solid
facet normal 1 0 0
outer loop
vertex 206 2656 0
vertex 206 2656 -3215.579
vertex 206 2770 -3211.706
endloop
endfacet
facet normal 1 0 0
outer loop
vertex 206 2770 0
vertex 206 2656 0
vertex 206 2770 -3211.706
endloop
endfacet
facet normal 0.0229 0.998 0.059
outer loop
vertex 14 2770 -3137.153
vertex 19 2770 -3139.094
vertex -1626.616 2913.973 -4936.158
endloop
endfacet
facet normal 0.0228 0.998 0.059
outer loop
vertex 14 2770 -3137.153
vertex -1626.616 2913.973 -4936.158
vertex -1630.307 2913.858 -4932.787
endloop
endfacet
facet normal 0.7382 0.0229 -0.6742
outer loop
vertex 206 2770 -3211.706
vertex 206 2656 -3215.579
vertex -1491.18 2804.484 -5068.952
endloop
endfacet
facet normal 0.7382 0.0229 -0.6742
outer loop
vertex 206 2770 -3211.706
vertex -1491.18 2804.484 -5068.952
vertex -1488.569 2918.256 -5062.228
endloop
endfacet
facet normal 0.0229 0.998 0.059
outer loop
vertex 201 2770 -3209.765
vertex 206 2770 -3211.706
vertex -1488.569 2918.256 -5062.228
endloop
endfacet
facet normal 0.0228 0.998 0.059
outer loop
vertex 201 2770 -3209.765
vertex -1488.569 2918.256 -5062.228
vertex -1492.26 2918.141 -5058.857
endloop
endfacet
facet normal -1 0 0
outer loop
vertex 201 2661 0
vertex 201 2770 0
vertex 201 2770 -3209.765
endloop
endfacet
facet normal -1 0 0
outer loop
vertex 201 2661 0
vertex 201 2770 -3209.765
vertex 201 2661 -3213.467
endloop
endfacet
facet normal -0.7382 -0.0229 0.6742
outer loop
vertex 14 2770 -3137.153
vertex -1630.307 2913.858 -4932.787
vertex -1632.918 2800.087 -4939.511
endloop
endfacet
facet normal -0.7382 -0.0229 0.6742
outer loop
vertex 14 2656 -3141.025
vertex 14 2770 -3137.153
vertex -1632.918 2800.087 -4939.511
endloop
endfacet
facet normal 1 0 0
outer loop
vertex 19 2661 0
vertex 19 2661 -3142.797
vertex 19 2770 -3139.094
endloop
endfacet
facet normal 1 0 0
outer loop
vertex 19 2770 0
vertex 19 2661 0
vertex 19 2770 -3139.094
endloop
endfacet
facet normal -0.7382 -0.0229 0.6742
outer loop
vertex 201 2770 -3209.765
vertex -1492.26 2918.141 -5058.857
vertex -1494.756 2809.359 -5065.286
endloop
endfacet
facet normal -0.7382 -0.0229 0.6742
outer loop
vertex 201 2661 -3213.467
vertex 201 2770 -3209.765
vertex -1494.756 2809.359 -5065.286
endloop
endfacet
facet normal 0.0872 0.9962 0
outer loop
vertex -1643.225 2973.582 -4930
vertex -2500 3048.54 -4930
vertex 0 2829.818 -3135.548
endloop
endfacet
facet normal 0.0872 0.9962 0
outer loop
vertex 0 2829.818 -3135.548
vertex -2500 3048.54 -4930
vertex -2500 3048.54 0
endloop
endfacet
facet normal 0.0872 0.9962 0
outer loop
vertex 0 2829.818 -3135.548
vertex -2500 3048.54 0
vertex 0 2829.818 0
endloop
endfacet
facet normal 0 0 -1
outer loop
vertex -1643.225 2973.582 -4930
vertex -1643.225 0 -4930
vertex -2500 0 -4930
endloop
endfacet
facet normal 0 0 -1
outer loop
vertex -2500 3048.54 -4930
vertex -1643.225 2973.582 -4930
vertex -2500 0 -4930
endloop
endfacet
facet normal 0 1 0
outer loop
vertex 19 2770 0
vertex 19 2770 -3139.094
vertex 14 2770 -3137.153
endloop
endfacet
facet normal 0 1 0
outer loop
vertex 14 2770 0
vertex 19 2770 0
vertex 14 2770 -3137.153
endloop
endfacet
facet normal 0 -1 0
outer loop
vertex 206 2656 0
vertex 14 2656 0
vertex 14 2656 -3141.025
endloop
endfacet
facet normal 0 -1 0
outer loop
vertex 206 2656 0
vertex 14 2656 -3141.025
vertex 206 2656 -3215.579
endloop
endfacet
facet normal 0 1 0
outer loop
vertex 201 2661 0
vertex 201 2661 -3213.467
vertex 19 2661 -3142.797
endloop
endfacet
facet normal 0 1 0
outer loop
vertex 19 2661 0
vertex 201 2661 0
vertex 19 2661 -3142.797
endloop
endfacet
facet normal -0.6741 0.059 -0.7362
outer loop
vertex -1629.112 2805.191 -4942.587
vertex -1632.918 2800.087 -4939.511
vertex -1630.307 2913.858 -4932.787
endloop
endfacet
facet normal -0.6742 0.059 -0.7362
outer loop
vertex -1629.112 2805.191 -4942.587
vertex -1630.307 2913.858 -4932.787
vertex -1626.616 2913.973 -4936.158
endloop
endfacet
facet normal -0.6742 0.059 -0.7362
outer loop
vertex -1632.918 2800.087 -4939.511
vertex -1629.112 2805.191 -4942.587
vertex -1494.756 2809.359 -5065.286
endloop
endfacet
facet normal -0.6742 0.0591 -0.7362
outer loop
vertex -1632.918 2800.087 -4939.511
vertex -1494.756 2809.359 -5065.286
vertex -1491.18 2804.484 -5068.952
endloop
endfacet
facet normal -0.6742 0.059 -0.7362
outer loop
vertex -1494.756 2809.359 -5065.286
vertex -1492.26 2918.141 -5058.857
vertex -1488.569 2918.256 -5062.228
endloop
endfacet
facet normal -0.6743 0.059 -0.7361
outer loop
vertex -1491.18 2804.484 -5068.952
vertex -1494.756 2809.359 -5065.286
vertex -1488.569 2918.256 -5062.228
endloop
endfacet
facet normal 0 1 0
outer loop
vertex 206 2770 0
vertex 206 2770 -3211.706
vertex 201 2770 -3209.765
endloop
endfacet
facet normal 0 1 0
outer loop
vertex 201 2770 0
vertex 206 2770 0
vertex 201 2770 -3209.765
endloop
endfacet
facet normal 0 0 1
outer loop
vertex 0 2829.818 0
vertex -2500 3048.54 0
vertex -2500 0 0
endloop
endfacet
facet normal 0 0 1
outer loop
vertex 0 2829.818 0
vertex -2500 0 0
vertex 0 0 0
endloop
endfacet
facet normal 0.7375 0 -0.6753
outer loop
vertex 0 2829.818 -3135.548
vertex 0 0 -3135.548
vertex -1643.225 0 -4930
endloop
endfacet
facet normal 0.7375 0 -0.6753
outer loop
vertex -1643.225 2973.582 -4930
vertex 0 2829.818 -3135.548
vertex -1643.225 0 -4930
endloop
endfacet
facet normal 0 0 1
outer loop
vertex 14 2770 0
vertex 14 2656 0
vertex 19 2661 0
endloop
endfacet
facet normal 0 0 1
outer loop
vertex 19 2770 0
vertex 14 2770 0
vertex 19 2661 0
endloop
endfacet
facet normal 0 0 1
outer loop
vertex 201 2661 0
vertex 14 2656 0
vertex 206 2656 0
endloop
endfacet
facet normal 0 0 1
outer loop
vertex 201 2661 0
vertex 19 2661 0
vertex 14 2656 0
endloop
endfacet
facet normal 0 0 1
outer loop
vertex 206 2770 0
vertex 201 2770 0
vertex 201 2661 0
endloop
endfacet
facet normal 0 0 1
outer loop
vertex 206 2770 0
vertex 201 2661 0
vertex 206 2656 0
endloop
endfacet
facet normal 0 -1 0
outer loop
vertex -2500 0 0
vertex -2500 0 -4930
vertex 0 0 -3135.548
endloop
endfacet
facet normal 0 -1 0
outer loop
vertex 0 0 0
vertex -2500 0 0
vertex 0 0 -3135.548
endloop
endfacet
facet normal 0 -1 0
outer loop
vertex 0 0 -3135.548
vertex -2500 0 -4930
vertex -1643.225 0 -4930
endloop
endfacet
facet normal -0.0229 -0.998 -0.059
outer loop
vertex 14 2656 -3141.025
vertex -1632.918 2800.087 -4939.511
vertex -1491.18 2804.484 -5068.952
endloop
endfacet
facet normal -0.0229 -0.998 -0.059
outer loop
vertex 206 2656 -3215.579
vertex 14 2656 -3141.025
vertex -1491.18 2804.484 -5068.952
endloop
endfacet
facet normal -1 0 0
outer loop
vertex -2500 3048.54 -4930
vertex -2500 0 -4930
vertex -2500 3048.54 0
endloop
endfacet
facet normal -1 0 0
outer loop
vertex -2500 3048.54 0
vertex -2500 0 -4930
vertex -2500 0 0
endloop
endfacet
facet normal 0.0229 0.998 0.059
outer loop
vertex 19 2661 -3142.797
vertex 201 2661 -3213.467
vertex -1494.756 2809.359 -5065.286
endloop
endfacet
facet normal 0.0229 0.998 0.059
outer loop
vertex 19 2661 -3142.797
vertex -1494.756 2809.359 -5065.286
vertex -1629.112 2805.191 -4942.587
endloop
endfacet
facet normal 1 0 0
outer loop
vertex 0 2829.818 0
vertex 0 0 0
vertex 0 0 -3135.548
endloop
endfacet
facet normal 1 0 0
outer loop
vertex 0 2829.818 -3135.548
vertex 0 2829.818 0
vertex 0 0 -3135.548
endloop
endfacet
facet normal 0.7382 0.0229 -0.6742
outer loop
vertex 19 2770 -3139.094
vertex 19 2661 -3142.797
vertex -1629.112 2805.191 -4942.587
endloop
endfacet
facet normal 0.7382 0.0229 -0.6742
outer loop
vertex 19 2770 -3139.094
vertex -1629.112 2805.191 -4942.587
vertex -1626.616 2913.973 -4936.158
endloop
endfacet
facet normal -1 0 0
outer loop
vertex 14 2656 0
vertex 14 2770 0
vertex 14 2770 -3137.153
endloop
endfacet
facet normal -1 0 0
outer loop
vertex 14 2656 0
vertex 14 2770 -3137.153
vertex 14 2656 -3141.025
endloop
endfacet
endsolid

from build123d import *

# Parameters (mm, degrees)
AUFSATZ_LINEAR_AUSTRAGEN1_DEPTH = 3048.54
SCHNITT_LINEAR_AUSTRAGEN1_DEPTH = 4931


with BuildPart() as part:
    # Skizze1 → Aufsatz-Linear austragen1 (new body)
    with BuildSketch(Plane(origin=(0, 0, 0), x_dir=(1, 0, 0), z_dir=(0, 1, 0))):
        Polygon((-2500, 4930), (-2500, 0), (0, 0), (0, 3135.547559896), (-1643.224828015, 4930), align=None)
    extrude(amount=AUFSATZ_LINEAR_AUSTRAGEN1_DEPTH)

    # Skizze2 → Schnitt-Linear austragen1 (cut, through all)
    with BuildSketch(Plane.XY):
        Polygon((-2500, 3048.54), (0, 2829.818341185), (0, 3048.54), align=None)
    extrude(amount=-SCHNITT_LINEAR_AUSTRAGEN1_DEPTH, mode=Mode.SUBTRACT)


with BuildPart() as body_2:
    # Austragung3: sweep along a path in Skizze4
    with BuildLine(Plane(origin=(230.711125671, 2637.040233244, 0), x_dir=(0.996194698, -0.087155743, 0), z_dir=(0.087155743, 0.996194698, 0))) as austragung3_path:
        Line((-231.59240469, 0), (-231.59240469, 3135.547559896))
        Line((-231.59240469, 3135.547559896), (-1881.094084596, 4930))
    # Skizze3 → Austragung3 (sweep)
    with BuildSketch(Plane.XY):
        Polygon((14, 2656), (14, 2770), (19, 2770), (19, 2661), (110, 2661), (201, 2661), (201, 2770), (206, 2770), (206, 2656), (110, 2656), align=None)
    sweep(path=austragung3_path.line, transition=Transition.RIGHT)


solid = Compound([part.part, body_2.part])
